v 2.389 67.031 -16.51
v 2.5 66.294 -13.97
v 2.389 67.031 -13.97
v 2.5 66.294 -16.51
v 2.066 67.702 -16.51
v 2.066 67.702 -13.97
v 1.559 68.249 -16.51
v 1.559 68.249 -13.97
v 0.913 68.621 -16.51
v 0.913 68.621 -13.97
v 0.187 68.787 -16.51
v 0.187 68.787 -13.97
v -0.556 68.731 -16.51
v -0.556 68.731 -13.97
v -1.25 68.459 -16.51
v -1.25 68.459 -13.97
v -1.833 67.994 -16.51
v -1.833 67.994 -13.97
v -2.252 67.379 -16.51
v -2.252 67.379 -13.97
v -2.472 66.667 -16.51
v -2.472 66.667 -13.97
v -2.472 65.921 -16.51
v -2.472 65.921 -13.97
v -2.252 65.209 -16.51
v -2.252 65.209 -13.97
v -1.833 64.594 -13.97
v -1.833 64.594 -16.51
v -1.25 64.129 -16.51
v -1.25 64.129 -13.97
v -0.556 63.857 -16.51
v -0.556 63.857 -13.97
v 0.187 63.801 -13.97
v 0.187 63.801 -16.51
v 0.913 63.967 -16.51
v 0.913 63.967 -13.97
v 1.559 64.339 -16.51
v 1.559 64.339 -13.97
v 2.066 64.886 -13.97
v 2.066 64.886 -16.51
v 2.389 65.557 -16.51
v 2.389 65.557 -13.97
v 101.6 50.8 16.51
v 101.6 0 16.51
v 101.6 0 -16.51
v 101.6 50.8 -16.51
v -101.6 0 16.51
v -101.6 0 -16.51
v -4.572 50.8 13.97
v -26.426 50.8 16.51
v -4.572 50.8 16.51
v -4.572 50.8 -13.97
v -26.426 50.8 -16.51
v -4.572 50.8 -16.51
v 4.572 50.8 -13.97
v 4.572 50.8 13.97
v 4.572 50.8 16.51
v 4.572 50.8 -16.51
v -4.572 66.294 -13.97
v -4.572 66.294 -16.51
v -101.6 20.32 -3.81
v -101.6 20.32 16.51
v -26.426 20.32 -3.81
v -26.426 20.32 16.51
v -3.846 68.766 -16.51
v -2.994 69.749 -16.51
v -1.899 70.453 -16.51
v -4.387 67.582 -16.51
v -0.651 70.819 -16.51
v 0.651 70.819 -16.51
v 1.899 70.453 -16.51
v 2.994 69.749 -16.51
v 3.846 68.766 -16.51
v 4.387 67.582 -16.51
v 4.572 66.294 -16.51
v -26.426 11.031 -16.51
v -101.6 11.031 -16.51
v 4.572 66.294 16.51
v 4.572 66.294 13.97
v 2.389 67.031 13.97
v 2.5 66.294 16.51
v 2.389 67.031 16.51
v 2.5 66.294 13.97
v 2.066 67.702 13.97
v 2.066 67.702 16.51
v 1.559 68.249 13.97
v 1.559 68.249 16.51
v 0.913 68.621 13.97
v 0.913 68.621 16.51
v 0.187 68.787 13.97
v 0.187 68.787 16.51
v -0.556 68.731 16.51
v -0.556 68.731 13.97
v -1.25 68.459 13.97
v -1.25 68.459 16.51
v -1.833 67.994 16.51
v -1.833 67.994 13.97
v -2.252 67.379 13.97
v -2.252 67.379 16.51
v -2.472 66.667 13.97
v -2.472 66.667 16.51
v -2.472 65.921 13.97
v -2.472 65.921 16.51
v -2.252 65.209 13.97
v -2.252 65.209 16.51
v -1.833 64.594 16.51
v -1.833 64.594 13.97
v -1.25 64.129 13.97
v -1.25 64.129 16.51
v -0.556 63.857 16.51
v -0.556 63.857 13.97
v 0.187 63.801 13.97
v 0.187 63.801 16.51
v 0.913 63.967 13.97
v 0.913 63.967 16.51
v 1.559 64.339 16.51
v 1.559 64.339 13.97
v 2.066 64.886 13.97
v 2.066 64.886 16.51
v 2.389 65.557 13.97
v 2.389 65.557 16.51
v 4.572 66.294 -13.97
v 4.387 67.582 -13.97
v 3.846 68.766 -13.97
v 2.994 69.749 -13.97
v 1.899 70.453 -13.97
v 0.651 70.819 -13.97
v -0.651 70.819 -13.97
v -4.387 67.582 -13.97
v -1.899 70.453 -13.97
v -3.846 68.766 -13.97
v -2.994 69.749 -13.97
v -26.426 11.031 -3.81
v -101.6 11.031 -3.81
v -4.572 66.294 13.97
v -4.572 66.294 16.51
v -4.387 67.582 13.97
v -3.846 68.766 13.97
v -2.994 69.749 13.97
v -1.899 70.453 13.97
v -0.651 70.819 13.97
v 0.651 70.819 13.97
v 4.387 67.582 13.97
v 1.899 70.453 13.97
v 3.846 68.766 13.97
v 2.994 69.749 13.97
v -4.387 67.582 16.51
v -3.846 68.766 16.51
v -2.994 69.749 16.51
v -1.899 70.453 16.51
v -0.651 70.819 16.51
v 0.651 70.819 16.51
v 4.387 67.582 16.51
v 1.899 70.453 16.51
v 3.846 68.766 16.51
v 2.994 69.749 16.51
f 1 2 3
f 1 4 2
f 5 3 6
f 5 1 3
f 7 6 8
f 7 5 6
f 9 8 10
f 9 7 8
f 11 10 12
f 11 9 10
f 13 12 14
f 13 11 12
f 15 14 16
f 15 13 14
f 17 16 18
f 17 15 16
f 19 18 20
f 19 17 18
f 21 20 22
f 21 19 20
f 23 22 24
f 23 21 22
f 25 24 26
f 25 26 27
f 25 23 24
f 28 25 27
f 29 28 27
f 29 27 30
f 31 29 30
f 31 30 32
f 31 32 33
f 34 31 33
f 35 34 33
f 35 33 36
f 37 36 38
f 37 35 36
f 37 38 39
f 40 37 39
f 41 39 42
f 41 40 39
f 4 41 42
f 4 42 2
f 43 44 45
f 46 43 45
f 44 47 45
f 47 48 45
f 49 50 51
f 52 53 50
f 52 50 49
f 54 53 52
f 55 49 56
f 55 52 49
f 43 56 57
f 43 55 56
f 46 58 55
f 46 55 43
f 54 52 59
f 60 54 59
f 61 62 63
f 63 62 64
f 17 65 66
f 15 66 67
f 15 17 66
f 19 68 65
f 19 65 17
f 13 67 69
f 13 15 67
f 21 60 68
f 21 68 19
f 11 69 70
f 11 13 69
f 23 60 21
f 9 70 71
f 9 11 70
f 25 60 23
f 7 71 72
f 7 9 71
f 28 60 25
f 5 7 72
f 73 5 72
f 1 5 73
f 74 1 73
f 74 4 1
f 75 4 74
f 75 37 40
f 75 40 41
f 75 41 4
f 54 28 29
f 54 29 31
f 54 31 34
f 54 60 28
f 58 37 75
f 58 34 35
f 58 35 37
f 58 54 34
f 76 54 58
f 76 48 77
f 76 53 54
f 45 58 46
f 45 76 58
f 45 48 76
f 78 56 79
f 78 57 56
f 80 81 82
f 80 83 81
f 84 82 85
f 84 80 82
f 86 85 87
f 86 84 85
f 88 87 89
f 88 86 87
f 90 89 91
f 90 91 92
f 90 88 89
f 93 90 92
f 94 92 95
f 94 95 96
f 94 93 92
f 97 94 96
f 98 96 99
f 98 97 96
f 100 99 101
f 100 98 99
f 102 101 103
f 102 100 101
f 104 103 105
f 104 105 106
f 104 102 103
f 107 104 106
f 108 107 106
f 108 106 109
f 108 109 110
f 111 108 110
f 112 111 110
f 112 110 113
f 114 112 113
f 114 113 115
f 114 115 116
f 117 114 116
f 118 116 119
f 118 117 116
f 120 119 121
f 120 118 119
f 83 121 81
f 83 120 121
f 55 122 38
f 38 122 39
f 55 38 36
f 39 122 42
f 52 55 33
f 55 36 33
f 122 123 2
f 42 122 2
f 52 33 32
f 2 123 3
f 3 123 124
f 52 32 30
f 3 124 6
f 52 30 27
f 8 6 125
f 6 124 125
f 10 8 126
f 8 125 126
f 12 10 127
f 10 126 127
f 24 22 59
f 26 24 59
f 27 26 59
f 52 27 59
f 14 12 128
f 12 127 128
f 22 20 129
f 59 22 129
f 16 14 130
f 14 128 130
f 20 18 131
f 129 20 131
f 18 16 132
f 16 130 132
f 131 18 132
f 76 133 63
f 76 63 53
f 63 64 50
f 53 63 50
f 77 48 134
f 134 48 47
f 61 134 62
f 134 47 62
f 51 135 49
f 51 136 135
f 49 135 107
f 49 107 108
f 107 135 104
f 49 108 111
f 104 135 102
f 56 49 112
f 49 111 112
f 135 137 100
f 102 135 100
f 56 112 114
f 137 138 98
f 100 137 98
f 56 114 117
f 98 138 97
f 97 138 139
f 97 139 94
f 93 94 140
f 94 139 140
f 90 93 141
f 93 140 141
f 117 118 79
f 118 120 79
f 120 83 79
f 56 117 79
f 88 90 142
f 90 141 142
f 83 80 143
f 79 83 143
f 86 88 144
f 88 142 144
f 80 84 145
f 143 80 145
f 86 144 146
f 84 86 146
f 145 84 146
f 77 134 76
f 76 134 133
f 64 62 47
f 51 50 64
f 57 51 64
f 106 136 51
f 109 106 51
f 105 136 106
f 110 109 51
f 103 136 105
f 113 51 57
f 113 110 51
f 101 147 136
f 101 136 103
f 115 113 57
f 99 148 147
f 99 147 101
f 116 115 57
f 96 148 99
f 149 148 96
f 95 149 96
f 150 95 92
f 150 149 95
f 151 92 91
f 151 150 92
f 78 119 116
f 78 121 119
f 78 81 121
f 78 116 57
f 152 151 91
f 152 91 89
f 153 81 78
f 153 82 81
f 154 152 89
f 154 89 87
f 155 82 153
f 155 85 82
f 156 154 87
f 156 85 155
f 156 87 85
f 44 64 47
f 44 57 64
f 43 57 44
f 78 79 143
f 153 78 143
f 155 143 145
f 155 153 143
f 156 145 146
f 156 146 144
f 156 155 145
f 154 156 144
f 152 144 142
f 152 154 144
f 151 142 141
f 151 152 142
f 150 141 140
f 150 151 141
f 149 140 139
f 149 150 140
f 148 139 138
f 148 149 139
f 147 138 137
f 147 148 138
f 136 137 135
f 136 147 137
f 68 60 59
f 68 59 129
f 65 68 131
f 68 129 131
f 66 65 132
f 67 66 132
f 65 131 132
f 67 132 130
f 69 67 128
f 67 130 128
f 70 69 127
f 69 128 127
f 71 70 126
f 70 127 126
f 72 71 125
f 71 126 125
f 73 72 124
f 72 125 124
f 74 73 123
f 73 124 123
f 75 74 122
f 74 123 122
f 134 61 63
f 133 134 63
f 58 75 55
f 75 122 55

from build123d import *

# Parameters (mm, degrees)
SKETCH1_W           = 203.2
SKETCH1_H           = 33.02
BOSS_EXTRUDE1_DEPTH = 50.8
SKETCH4_W           = 75.174345078
SKETCH4_H           = 39.769068734
CUT_EXTRUDE2_DEPTH  = 119.294211186
SKETCH5_W           = 75.174345078
SKETCH5_H           = 9.289068734
BOSS_EXTRUDE3_DEPTH = 20.32
BOSS_EXTRUDE4_START = 15.24
SKETCH6_R           = 2.5
BOSS_EXTRUDE4_DEPTH = 1.27
BOSS_EXTRUDE5_START = -15.24
SKETCH6_3_R         = 2.5
BOSS_EXTRUDE5_DEPTH = 1.27


with BuildPart() as part:
    # Sketch1 → Boss-Extrude1 (new body)
    with BuildSketch(Plane(origin=(0, 0, 0), x_dir=(1, 0, 0), z_dir=(0, 1, 0))):
        Rectangle(SKETCH1_W, SKETCH1_H)
    extrude(amount=BOSS_EXTRUDE1_DEPTH)

    # Sketch4 → Cut-Extrude2 (cut, through all)
    with BuildSketch(Plane.XY.offset(16.51)):
        with Locations((-64.012827461, 30.915465633)):
            Rectangle(SKETCH4_W, SKETCH4_H)
    extrude(amount=-CUT_EXTRUDE2_DEPTH, mode=Mode.SUBTRACT)

    # Sketch5 → Boss-Extrude3 (add)
    with BuildSketch(Plane.XY.offset(16.51)):
        with Locations((-64.012827461, 15.675465633)):
            Rectangle(SKETCH5_W, SKETCH5_H)
    extrude(amount=-BOSS_EXTRUDE3_DEPTH)

    # Sketch6 → Boss-Extrude4 (add, symmetric)
    with BuildSketch(Plane.XY.offset(BOSS_EXTRUDE4_START)):
        with BuildLine():
            Line((-4.572, 66.294), (-4.572, 50.8))
            Line((-4.572, 50.8), (4.572, 50.8))
            Line((4.572, 50.8), (4.572, 66.294))
            ThreePointArc((4.572, 66.294), (0, 70.866), (-4.572, 66.294))
        make_face()
        with Locations((0, 66.294)):
            Circle(SKETCH6_R, mode=Mode.SUBTRACT)
    extrude(amount=BOSS_EXTRUDE4_DEPTH, both=True)

    # Sketch6<3> → Boss-Extrude5 (add, symmetric)
    with BuildSketch(Plane.XY.offset(BOSS_EXTRUDE5_START)):
        with BuildLine():
            Line((-4.572, 50.8), (-4.572, 66.294))
            ThreePointArc((-4.572, 66.294), (0, 70.866), (4.572, 66.294))
            Line((4.572, 66.294), (4.572, 50.8))
            Line((4.572, 50.8), (-4.572, 50.8))
        make_face()
        with Locations((0, 66.294)):
            Circle(SKETCH6_3_R, mode=Mode.SUBTRACT)
    extrude(amount=BOSS_EXTRUDE5_DEPTH, both=True)


solid = part.part
